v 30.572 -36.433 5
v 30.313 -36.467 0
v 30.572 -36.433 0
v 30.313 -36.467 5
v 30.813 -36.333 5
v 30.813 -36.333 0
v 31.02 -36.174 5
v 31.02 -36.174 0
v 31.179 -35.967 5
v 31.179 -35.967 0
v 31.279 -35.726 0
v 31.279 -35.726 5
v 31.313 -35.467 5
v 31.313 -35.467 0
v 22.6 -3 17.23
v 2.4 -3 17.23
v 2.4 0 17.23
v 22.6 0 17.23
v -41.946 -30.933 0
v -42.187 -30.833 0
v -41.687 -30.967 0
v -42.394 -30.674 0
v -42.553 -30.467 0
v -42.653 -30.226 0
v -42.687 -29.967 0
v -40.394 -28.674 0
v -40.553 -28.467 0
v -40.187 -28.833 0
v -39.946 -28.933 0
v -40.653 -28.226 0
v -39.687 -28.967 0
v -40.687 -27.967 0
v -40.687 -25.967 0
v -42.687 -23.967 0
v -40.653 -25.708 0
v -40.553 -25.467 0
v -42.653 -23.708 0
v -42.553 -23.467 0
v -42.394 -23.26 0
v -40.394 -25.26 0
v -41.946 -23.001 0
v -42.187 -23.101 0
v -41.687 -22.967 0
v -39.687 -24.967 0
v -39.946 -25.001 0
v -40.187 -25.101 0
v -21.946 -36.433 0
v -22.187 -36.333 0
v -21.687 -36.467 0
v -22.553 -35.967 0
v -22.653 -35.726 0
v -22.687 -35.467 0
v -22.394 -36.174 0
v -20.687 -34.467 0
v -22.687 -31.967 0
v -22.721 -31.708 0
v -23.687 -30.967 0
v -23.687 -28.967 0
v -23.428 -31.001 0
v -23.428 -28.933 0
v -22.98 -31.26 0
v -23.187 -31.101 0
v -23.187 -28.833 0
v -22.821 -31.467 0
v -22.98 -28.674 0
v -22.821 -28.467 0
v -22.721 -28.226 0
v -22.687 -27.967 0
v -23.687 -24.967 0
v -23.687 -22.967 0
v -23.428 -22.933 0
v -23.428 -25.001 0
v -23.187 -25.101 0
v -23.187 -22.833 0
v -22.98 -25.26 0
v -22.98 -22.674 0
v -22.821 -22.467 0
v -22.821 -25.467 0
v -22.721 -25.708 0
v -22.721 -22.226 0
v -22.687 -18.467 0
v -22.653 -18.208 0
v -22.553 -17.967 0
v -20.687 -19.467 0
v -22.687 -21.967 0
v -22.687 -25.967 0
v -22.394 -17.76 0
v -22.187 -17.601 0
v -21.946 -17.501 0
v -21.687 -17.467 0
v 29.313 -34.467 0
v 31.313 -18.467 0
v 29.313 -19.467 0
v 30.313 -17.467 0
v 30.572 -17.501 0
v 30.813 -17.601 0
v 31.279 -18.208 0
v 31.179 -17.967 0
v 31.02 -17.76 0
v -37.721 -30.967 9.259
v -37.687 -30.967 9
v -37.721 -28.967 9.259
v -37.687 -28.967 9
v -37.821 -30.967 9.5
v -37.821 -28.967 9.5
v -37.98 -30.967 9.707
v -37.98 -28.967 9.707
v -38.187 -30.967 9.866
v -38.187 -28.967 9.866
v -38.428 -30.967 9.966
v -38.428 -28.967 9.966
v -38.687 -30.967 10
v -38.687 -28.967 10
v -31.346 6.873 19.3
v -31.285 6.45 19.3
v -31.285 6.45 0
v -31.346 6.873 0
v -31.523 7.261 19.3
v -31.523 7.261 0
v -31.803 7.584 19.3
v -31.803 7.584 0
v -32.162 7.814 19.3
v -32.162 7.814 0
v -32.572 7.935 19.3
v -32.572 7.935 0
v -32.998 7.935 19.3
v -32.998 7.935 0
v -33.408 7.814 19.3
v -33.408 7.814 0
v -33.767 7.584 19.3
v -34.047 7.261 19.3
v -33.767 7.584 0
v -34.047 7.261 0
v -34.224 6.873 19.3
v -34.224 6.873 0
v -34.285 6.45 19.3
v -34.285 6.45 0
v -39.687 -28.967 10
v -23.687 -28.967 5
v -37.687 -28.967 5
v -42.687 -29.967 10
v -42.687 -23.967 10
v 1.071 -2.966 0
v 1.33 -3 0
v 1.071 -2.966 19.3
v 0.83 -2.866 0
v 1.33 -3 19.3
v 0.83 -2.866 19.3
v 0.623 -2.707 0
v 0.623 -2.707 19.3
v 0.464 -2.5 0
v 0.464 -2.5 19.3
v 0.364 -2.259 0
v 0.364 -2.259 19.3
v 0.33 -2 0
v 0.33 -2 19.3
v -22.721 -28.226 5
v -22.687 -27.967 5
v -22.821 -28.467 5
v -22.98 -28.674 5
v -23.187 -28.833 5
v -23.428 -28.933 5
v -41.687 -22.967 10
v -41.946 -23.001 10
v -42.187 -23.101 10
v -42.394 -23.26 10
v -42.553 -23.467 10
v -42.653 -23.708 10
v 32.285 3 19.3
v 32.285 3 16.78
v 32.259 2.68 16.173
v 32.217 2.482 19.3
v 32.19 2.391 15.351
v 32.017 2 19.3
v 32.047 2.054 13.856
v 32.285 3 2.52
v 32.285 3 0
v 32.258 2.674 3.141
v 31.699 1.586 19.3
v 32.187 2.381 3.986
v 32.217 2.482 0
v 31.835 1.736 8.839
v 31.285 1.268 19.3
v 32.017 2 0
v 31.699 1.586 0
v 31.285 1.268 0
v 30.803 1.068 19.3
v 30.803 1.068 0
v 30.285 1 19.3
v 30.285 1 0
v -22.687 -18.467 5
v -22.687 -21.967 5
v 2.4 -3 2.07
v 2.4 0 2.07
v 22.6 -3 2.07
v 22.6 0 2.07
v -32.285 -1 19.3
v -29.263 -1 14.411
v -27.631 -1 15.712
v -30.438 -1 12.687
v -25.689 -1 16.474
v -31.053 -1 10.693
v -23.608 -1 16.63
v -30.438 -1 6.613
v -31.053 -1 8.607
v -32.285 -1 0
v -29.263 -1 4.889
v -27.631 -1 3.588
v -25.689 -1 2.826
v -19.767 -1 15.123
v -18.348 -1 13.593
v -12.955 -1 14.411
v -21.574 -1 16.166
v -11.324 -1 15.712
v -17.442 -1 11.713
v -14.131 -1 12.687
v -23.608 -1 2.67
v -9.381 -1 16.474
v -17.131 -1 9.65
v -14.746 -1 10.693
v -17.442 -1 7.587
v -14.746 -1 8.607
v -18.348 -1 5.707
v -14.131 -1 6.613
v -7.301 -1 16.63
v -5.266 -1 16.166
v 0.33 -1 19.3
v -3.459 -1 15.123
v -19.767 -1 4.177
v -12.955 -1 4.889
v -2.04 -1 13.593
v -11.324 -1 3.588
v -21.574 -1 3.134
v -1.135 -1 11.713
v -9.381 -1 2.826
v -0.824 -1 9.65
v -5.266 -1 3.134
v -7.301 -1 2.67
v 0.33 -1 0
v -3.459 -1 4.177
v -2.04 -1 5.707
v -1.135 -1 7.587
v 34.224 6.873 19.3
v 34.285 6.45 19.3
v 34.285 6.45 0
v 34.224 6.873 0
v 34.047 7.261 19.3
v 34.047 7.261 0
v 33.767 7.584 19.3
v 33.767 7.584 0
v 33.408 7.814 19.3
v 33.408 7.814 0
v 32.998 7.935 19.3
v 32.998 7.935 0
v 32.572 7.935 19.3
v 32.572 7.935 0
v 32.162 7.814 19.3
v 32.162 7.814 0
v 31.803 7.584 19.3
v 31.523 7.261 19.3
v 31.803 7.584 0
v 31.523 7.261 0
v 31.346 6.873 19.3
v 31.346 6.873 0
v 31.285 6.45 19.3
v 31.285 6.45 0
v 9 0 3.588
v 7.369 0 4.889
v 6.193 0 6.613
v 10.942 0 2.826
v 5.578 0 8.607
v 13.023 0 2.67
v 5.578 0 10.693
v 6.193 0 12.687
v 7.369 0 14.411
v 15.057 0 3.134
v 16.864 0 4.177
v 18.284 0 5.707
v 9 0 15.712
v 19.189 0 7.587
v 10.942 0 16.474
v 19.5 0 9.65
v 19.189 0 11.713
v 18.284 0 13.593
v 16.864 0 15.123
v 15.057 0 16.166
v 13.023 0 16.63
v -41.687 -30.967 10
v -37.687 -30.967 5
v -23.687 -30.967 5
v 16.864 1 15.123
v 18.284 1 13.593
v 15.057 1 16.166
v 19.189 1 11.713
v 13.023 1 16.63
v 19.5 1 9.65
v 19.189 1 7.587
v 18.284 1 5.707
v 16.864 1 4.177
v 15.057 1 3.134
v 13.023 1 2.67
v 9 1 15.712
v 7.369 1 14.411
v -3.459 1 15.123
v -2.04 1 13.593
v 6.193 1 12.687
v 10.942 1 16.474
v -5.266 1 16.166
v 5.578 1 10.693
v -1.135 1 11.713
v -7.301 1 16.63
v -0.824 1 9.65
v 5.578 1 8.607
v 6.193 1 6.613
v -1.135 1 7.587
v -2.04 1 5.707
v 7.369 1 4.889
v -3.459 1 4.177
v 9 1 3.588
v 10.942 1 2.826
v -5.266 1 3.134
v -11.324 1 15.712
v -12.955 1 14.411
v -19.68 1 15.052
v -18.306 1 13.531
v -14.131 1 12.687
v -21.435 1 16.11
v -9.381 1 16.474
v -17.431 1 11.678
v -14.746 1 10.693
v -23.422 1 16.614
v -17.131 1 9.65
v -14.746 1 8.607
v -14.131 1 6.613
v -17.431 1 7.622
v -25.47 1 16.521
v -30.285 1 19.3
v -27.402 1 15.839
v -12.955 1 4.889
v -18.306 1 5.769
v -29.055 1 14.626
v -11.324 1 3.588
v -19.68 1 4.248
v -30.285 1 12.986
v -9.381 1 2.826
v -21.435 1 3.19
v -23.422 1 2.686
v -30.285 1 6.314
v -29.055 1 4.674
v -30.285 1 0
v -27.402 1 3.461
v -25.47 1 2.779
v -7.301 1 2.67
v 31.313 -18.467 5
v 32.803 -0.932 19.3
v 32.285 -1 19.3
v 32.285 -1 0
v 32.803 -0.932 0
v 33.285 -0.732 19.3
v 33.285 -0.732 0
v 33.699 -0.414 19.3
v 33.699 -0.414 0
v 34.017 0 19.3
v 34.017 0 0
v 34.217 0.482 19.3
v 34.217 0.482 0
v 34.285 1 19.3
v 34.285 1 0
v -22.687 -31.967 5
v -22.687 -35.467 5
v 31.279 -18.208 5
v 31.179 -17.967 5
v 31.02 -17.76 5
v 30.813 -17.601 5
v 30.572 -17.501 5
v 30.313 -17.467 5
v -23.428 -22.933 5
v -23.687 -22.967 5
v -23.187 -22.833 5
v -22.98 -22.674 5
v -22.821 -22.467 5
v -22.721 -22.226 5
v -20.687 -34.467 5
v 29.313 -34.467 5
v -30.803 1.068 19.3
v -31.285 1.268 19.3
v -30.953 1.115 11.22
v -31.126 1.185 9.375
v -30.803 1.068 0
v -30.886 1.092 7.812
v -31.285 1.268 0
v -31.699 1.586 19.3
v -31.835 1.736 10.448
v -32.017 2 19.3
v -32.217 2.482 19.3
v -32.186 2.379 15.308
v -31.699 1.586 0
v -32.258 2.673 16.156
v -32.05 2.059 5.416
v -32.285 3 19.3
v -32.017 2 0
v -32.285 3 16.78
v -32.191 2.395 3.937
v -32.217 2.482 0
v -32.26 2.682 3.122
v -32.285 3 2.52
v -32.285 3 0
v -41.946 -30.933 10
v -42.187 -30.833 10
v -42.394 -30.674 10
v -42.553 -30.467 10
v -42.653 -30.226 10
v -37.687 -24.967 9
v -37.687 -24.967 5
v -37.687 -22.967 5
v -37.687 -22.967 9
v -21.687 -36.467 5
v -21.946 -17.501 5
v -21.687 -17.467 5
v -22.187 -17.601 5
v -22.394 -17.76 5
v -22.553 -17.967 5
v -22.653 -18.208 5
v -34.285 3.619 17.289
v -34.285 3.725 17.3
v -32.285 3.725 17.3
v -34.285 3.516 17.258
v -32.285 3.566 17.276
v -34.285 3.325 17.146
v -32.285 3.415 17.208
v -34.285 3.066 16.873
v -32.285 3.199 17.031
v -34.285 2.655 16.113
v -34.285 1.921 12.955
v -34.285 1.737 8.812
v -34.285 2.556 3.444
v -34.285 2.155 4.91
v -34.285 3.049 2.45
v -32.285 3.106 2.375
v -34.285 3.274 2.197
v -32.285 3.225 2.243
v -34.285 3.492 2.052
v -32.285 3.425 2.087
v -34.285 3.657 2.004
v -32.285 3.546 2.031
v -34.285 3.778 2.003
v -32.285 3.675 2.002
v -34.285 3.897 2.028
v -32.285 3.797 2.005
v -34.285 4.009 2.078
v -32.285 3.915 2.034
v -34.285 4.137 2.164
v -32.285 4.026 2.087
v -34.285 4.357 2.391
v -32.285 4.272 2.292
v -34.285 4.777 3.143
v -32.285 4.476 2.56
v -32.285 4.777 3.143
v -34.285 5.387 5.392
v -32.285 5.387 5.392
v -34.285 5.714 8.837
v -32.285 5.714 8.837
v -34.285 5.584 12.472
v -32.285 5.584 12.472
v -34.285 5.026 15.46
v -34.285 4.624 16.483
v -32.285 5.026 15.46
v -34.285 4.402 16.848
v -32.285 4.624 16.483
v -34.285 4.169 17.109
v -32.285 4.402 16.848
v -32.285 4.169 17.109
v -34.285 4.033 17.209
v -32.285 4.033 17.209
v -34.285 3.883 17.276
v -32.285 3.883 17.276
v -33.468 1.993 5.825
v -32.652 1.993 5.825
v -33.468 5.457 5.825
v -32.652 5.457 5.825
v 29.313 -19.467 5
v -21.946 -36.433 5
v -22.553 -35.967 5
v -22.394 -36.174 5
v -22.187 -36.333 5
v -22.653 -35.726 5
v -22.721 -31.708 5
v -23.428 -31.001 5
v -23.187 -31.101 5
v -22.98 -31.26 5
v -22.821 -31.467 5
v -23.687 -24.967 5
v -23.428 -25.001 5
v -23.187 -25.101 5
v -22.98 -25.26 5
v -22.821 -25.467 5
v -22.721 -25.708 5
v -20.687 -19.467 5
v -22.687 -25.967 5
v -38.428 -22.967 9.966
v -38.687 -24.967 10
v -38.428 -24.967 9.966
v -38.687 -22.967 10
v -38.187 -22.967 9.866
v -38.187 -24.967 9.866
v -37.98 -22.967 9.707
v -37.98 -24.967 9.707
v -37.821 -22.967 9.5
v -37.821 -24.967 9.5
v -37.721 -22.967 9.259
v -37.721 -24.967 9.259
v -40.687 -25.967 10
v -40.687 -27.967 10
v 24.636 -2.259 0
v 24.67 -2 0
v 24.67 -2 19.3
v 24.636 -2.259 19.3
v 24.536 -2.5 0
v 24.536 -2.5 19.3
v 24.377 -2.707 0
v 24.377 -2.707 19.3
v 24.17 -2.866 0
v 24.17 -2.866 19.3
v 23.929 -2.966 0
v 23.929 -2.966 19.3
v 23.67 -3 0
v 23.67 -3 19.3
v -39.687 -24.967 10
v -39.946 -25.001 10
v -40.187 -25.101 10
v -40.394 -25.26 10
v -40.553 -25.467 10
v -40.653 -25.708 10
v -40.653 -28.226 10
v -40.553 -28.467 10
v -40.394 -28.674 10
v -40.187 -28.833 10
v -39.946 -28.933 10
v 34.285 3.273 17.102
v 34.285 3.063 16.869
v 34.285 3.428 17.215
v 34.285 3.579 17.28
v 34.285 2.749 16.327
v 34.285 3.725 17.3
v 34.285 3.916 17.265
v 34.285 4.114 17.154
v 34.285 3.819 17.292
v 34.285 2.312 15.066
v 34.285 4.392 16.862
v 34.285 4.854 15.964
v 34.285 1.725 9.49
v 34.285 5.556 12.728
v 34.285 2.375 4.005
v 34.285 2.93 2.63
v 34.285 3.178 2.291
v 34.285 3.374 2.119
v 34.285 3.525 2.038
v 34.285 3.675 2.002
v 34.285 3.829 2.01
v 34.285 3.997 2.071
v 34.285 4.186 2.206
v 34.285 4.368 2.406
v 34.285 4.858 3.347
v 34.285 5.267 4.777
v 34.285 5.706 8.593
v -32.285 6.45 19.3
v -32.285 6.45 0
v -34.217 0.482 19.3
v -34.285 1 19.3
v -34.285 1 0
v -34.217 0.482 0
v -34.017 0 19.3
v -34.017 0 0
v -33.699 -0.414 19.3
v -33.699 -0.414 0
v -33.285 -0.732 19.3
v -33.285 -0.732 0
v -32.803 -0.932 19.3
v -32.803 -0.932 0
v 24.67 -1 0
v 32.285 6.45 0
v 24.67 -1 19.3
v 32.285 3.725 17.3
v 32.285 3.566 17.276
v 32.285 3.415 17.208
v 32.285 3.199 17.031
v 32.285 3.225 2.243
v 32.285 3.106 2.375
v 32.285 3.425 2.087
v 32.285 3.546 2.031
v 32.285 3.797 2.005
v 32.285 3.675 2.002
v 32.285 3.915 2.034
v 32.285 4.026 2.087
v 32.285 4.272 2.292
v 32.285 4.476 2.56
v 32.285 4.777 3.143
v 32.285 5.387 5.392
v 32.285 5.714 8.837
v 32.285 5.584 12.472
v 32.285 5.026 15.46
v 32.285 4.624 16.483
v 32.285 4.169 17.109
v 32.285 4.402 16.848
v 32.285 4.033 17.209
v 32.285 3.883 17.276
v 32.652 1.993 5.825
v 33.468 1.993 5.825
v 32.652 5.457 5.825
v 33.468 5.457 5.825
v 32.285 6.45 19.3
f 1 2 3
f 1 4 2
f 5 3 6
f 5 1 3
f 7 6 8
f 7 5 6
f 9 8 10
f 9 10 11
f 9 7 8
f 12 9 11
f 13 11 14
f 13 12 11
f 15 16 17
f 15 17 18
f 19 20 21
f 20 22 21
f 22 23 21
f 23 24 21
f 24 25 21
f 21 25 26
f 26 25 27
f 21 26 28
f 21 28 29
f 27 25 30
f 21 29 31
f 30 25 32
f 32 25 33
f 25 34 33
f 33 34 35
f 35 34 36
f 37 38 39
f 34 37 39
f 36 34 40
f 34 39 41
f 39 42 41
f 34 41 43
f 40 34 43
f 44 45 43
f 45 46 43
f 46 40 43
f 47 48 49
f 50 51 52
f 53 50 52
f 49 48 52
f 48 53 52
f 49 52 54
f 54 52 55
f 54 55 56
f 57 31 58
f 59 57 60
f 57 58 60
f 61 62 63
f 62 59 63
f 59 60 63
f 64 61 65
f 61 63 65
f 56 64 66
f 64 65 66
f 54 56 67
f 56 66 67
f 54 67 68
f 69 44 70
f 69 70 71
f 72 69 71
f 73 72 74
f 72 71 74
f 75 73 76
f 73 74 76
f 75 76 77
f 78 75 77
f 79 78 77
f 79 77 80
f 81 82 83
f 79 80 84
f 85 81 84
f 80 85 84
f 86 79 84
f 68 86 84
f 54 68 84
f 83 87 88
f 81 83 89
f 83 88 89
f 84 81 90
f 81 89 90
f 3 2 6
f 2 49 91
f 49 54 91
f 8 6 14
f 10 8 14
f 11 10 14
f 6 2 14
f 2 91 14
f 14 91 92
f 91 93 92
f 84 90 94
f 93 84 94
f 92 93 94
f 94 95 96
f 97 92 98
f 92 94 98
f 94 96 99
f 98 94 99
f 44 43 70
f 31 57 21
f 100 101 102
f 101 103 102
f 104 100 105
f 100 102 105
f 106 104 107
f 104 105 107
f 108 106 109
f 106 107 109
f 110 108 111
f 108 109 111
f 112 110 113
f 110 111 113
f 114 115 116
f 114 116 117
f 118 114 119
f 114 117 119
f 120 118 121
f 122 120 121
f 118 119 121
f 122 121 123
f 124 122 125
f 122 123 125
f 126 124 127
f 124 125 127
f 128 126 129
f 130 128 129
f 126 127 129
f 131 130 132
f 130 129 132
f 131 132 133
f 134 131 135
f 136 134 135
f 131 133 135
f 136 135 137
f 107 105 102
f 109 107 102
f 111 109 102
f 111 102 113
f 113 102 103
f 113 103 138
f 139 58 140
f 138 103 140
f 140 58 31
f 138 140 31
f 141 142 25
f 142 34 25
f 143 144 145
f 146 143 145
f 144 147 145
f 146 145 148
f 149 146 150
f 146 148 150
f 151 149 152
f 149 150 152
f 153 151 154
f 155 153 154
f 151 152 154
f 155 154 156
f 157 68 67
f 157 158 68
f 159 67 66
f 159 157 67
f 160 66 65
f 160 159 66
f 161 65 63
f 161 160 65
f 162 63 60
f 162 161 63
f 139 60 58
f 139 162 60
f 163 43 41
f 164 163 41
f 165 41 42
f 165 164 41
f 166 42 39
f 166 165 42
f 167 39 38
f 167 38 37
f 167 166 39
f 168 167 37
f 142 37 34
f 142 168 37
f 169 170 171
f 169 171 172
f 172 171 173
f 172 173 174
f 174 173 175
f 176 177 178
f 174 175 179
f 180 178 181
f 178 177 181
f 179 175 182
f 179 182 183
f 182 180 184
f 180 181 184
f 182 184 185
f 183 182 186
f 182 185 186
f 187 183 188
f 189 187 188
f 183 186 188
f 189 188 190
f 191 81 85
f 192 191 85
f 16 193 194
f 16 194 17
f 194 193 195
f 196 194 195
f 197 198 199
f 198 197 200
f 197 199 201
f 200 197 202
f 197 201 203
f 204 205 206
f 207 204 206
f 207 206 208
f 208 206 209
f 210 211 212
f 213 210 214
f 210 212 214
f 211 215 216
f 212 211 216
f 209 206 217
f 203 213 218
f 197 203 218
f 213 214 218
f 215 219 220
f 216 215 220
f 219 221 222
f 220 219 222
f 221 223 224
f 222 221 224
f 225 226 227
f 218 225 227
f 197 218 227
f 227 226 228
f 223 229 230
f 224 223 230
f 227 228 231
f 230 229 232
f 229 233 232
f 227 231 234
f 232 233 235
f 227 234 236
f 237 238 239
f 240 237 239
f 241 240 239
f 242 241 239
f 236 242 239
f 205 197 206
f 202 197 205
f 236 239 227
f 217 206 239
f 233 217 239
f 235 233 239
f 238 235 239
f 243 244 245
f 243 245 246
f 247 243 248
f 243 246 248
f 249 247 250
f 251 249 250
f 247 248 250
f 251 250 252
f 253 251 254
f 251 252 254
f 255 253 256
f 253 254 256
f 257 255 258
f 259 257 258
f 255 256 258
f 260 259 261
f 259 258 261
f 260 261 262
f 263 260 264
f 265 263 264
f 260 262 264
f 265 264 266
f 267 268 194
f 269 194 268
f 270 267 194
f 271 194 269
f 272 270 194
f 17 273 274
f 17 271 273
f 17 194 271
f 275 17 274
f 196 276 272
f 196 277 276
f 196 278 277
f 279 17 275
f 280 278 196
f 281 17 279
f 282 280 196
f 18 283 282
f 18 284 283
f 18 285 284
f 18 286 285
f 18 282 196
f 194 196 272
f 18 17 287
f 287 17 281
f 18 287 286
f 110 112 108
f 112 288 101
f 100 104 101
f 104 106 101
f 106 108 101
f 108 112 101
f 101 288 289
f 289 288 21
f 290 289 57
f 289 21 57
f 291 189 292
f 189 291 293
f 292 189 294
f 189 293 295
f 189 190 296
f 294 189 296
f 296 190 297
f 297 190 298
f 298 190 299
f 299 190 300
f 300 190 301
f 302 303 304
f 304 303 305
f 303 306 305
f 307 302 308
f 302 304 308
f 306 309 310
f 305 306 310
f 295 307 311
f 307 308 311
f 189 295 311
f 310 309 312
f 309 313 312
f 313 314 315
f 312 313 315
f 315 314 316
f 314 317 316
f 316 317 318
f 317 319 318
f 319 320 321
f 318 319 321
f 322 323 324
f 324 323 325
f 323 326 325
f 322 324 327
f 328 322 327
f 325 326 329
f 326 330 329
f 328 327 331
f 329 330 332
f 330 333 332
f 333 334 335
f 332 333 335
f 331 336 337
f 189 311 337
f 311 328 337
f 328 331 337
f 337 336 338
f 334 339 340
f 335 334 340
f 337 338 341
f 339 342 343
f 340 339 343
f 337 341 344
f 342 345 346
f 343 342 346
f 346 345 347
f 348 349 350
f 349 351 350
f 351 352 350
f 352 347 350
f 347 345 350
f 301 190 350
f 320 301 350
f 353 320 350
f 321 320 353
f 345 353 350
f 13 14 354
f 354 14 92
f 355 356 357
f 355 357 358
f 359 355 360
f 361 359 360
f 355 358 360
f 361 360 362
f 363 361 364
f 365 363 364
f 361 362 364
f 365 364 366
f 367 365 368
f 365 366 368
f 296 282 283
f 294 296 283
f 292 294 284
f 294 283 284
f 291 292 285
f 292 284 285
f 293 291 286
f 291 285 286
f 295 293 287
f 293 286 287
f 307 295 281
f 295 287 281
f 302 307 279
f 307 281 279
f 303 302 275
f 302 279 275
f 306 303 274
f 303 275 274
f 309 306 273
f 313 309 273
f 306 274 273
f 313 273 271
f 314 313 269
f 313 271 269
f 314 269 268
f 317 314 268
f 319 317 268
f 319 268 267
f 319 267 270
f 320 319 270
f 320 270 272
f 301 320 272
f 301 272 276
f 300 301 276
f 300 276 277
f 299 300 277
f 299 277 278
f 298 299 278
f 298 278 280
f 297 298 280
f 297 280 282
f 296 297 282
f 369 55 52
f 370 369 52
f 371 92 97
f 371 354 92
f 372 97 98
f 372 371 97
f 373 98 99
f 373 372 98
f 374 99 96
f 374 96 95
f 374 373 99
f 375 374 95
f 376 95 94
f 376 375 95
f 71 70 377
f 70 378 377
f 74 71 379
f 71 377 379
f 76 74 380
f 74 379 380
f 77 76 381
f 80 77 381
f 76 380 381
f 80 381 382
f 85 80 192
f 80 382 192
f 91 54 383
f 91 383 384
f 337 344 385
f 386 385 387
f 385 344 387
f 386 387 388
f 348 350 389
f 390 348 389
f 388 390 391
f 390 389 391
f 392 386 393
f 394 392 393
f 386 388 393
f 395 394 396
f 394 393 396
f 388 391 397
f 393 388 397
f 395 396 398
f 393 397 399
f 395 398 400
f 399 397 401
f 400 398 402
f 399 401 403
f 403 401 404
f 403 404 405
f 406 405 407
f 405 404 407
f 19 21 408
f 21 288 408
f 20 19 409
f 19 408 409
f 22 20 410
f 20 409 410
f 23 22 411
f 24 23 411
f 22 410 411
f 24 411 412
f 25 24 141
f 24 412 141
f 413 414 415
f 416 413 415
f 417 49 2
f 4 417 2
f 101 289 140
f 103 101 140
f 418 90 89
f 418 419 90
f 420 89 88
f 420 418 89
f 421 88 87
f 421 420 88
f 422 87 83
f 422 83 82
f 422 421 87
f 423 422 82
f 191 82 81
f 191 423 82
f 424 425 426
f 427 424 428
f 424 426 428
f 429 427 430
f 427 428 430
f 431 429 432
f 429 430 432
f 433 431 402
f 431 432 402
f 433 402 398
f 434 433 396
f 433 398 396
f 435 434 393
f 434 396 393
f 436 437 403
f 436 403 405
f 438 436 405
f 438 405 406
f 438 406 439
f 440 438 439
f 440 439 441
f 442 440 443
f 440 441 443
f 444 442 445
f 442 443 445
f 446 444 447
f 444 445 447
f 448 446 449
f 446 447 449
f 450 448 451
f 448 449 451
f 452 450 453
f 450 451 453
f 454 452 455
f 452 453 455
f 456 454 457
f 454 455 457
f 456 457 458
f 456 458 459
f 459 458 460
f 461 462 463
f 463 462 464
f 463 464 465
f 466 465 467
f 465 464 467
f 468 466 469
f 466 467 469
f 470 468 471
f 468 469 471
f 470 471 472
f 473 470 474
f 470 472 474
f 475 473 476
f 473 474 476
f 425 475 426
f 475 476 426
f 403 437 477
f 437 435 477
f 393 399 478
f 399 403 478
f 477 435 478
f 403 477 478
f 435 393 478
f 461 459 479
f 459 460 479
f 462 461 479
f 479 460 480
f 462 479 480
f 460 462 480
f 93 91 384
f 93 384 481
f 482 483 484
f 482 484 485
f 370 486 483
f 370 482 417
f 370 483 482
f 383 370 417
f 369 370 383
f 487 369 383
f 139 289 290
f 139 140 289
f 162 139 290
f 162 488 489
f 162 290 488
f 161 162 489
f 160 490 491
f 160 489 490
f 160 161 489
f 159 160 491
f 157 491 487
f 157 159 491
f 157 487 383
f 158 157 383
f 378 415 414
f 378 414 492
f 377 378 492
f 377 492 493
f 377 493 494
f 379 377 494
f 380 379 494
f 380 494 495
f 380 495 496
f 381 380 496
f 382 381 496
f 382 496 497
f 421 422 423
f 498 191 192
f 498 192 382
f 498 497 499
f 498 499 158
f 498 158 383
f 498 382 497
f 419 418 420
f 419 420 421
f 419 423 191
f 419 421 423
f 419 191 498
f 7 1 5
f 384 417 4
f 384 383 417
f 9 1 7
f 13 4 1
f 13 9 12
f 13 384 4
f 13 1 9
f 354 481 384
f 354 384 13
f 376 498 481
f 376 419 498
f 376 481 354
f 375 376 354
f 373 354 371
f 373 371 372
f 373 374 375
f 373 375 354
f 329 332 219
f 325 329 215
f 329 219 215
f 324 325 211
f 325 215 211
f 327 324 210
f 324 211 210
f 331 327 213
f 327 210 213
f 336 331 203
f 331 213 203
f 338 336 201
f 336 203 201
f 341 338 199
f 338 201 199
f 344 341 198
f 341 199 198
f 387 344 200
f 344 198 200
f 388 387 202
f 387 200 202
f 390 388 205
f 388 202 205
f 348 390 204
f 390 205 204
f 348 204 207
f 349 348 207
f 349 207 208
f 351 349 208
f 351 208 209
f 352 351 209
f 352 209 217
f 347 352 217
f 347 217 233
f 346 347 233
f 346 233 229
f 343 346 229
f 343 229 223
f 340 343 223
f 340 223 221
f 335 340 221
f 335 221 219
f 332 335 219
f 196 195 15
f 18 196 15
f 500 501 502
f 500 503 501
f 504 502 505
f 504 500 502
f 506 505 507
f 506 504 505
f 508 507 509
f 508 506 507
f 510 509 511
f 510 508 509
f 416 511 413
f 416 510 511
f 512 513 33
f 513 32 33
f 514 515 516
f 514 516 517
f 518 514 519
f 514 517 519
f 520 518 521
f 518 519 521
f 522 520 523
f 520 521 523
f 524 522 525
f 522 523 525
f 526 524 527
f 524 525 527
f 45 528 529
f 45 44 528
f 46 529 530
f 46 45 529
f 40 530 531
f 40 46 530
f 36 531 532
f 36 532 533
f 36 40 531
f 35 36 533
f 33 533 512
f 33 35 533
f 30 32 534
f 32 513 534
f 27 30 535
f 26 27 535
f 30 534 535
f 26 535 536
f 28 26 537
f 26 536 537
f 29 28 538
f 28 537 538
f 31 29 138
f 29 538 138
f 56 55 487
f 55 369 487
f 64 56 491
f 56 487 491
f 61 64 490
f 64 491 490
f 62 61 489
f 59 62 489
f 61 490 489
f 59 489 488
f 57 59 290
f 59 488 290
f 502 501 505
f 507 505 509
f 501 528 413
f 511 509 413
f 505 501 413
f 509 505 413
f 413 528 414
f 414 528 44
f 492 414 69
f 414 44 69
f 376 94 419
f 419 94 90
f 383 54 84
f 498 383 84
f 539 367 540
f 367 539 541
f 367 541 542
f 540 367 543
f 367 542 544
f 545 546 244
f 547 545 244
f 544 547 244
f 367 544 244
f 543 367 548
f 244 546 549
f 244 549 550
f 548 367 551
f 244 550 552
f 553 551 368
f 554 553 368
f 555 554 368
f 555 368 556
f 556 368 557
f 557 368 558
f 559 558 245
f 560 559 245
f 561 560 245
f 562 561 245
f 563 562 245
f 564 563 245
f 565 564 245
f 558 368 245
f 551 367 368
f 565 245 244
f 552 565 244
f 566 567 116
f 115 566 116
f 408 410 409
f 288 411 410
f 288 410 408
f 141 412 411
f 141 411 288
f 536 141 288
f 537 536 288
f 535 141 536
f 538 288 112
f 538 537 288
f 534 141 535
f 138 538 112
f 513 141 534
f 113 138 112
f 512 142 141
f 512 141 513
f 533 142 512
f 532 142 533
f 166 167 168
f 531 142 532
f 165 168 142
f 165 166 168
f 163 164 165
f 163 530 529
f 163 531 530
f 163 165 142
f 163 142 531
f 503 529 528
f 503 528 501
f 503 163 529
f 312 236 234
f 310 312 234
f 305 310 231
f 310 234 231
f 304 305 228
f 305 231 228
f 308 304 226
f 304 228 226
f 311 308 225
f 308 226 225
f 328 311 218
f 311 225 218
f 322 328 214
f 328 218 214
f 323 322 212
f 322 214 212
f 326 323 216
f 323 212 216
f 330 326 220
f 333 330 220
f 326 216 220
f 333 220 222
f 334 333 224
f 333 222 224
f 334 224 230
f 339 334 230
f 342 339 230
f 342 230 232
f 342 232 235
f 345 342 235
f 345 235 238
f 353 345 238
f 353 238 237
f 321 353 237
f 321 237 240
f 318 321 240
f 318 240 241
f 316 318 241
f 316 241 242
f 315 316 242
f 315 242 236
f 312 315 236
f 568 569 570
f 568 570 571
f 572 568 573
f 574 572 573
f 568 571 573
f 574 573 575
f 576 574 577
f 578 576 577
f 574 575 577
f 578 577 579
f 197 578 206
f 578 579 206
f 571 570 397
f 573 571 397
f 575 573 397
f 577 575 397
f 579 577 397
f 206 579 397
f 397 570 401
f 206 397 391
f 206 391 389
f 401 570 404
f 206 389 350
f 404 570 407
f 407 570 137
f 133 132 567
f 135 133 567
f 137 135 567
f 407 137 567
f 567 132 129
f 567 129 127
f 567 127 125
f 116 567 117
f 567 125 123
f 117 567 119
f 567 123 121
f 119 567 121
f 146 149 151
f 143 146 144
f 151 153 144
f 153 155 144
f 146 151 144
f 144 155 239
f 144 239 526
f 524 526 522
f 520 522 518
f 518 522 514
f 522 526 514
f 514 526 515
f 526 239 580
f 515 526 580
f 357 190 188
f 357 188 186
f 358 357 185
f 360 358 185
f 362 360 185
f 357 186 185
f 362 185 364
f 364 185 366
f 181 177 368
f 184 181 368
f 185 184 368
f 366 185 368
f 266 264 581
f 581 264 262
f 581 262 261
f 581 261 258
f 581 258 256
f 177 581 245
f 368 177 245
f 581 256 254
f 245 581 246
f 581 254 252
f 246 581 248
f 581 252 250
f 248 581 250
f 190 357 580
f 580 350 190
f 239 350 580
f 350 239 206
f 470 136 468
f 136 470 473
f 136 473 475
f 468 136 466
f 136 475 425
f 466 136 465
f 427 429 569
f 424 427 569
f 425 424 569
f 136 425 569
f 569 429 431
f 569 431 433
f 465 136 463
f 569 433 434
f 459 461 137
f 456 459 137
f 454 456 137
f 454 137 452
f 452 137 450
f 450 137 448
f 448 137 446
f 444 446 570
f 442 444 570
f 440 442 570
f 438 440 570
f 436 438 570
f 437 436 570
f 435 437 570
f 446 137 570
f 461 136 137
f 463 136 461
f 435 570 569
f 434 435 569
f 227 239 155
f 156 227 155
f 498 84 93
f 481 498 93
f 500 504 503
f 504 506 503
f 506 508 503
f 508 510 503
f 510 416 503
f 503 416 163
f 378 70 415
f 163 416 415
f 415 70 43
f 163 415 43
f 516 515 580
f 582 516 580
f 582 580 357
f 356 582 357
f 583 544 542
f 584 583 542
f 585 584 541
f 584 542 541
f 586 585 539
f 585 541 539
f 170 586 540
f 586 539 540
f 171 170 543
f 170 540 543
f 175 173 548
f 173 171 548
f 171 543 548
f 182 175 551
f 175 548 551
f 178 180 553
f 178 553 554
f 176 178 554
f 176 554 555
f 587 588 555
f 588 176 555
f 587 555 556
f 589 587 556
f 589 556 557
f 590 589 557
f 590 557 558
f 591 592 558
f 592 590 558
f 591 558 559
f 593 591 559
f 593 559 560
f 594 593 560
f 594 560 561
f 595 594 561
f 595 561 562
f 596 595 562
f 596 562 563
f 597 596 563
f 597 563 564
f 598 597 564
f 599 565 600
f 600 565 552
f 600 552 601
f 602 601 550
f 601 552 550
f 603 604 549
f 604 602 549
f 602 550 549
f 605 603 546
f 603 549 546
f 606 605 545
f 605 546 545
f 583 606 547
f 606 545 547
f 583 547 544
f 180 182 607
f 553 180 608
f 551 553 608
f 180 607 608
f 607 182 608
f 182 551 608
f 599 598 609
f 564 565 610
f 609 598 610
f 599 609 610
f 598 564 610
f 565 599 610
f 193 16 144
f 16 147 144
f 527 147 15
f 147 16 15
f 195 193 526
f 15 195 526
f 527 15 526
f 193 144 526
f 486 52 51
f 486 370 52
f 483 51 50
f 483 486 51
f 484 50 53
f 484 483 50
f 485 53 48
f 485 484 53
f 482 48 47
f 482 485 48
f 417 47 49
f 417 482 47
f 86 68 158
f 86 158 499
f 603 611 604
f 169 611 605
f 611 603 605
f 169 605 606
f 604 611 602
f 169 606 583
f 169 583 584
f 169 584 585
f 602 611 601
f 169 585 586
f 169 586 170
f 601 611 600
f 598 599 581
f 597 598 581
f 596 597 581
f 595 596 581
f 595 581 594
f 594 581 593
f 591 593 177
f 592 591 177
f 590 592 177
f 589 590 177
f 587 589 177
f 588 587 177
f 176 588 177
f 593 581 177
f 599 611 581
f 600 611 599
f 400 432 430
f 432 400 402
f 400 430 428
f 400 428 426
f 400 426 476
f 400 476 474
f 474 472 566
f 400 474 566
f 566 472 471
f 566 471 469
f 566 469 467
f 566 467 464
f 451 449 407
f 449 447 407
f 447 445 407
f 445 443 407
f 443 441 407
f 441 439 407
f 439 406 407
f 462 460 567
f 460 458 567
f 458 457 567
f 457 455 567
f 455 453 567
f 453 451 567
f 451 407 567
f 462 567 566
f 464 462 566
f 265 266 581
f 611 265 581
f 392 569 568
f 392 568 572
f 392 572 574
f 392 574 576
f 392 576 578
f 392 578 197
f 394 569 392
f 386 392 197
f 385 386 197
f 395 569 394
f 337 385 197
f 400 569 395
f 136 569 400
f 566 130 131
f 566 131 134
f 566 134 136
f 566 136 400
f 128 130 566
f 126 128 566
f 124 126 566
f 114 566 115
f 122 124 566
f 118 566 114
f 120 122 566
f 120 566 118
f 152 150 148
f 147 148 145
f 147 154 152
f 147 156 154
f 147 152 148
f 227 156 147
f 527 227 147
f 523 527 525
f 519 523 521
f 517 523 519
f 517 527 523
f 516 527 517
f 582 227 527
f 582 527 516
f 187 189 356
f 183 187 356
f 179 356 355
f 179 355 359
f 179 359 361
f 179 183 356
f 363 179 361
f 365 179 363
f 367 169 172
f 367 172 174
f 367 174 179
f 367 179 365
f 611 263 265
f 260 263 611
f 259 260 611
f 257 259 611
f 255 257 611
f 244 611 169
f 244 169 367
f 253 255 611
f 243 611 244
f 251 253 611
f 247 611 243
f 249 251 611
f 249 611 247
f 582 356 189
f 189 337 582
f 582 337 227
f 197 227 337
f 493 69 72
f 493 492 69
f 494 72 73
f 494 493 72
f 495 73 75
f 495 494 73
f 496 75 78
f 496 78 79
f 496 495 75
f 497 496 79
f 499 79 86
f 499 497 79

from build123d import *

# Parameters (mm, degrees)
F2_DEPTH  = 19.3
F5_DEPTH  = 68.571
F7_R      = 1
F6_W      = 18
F6_H      = 4
F6_W_2    = 50
F6_H_2    = 15
F8_DEPTH  = 5
F10_DEPTH = 5
F11_R     = 1
F3_W      = 20.2
F3_H      = 15.16
F12_DEPTH = 3
F13_R     = 7
F14_R     = 7
F15_DEPTH = 8.951


with BuildPart() as f2:
    # F1 (on Top) → F2 (new body)
    with BuildSketch(Plane.XY):
        with BuildLine():
            Line((24.67, -1), (32.285, -1))
            ThreePointArc((32.285, -1), (33.6992135624, -0.4142135624), (34.285, 1))
            Line((34.285, 1), (34.285, 6.45))
            ThreePointArc((34.285, 6.45), (32.785, 7.95), (31.285, 6.45))
            Line((31.285, 6.45), (32.285, 6.45))
            Line((32.285, 6.45), (32.285, 3))
            ThreePointArc((32.285, 3), (31.6992135624, 1.5857864376), (30.285, 1))
            Line((30.285, 1), (24.67, 1))
            Line((24.67, 1), (24.67, -1))
        make_face()
        Polygon((24.67, -3), (24.67, -1), (24.67, 1), (12.17, 1), (0.33, 1), (0.33, -1), (0.33, -3), align=None)
        with BuildLine():
            Line((0.33, -1), (0.33, 1))
            Line((0.33, 1), (-12.17, 1))
            Line((-12.17, 1), (-30.285, 1))
            ThreePointArc((-30.285, 1), (-31.6992135624, 1.5857864376), (-32.285, 3))
            Line((-32.285, 3), (-32.285, 6.45))
            Line((-32.285, 6.45), (-31.285, 6.45))
            ThreePointArc((-31.285, 6.45), (-32.785, 7.95), (-34.285, 6.45))
            Line((-34.285, 6.45), (-34.285, 1))
            ThreePointArc((-34.285, 1), (-33.6992135624, -0.4142135624), (-32.285, -1))
            Line((-32.285, -1), (-12.17, -1))
            Line((-12.17, -1), (0.33, -1))
        make_face()
    extrude(amount=F2_DEPTH)

    # F4 (on face) → F5 (cut, through all)
    with BuildSketch(Plane.YZ.offset(34.285)):
        with BuildLine():
            add(Edge.make_bspline(
                [(3.725, 17.3), (0.2608983849, 17.3), (1.9929491924, 5.825), (3.725, -5.65), (5.4570508076, 5.825), (7.1891016151, 17.3), (3.725, 17.3)],
                knots=[0, 0, 0, 2.0943951024, 2.0943951024, 4.1887902048, 4.1887902048, 6.2831853072, 6.2831853072, 6.2831853072], degree=2, weights=[1, 0.5, 1, 0.5, 1, 0.5, 1]))
        make_face()
    extrude(amount=-F5_DEPTH, mode=Mode.SUBTRACT)

    # F7
    f7_edges = [f2.edges().sort_by_distance(p)[0] for p in [
        (0.33, -3, 9.65),
        (24.67, -3, 9.65),
    ]]
    fillet(f7_edges, radius=F7_R)

    # F3 (on face) → F12 (cut)
    with BuildSketch(Plane.XZ.offset(3)):
        with Locations((12.5, 9.65)):
            Rectangle(F3_W, F3_H)
    extrude(amount=-F12_DEPTH, mode=Mode.SUBTRACT)

    # F13 (on face) + F14 (on face) → F15 (cut, through all)
    with BuildSketch(Plane.XZ.offset(1)):
        with Locations((-24.13125, 9.65)):
            Circle(F13_R)
        with Locations((-7.82375, 9.65)):
            Circle(F13_R)
    with BuildSketch(Plane.XZ):
        with Locations((12.5, 9.65)):
            Circle(F14_R)
    extrude(amount=-F15_DEPTH, mode=Mode.SUBTRACT)


with BuildPart() as f8:
    # F6 (on Top) → F8 (new body)
    with BuildSketch(Plane.XY):
        Polygon((-22.6870492548, -30.9672894628), (-22.6870492548, -36.4672894628), (31.3129507452, -36.4672894628), (31.3129507452, -17.4672894628), (-22.6870492548, -17.4672894628), (-22.6870492548, -22.9672894628), (-42.6870492548, -22.9672894628), (-42.6870492548, -30.9672894628), align=None)
        with Locations((-31.6870492548, -26.9672894628)):
            Rectangle(F6_W, F6_H, mode=Mode.SUBTRACT)
        with Locations((4.3129507452, -26.9672894628)):
            Rectangle(F6_W_2, F6_H_2, mode=Mode.SUBTRACT)
    extrude(amount=F8_DEPTH)

    # F9 (on face) → F10 (join)
    with BuildSketch(Plane.XY.offset(5)):
        Polygon((-37.6870492548, -22.9672894628), (-42.6870492548, -22.9672894628), (-42.6870492548, -30.9672894628), (-37.6870492548, -30.9672894628), (-37.6870492548, -28.9672894628), (-40.6870492548, -28.9672894628), (-40.6870492548, -24.9672894628), (-37.6870492548, -24.9672894628), align=None)
    extrude(amount=F10_DEPTH)

    # F11
    f11_edges = [f8.edges().sort_by_distance(p)[0] for p in [
        (-37.687049, -29.967289, 10),
        (-37.687049, -23.967289, 10),
        (-22.687049, -36.467289, 2.5),
        (31.312951, -36.467289, 2.5),
        (31.312951, -17.467289, 2.5),
        (-42.687049, -30.967289, 5),
        (-42.687049, -22.967289, 5),
        (-22.687049, -22.967289, 2.5),
        (-22.687049, -17.467289, 2.5),
        (-22.687049, -30.967289, 2.5),
        (-40.687049, -24.967289, 5),
        (-40.687049, -28.967289, 5),
        (-22.687049, -24.967289, 2.5),
        (-22.687049, -28.967289, 2.5),
    ]]
    fillet(f11_edges, radius=F11_R)


solid = Compound([f2.part, f8.part])
